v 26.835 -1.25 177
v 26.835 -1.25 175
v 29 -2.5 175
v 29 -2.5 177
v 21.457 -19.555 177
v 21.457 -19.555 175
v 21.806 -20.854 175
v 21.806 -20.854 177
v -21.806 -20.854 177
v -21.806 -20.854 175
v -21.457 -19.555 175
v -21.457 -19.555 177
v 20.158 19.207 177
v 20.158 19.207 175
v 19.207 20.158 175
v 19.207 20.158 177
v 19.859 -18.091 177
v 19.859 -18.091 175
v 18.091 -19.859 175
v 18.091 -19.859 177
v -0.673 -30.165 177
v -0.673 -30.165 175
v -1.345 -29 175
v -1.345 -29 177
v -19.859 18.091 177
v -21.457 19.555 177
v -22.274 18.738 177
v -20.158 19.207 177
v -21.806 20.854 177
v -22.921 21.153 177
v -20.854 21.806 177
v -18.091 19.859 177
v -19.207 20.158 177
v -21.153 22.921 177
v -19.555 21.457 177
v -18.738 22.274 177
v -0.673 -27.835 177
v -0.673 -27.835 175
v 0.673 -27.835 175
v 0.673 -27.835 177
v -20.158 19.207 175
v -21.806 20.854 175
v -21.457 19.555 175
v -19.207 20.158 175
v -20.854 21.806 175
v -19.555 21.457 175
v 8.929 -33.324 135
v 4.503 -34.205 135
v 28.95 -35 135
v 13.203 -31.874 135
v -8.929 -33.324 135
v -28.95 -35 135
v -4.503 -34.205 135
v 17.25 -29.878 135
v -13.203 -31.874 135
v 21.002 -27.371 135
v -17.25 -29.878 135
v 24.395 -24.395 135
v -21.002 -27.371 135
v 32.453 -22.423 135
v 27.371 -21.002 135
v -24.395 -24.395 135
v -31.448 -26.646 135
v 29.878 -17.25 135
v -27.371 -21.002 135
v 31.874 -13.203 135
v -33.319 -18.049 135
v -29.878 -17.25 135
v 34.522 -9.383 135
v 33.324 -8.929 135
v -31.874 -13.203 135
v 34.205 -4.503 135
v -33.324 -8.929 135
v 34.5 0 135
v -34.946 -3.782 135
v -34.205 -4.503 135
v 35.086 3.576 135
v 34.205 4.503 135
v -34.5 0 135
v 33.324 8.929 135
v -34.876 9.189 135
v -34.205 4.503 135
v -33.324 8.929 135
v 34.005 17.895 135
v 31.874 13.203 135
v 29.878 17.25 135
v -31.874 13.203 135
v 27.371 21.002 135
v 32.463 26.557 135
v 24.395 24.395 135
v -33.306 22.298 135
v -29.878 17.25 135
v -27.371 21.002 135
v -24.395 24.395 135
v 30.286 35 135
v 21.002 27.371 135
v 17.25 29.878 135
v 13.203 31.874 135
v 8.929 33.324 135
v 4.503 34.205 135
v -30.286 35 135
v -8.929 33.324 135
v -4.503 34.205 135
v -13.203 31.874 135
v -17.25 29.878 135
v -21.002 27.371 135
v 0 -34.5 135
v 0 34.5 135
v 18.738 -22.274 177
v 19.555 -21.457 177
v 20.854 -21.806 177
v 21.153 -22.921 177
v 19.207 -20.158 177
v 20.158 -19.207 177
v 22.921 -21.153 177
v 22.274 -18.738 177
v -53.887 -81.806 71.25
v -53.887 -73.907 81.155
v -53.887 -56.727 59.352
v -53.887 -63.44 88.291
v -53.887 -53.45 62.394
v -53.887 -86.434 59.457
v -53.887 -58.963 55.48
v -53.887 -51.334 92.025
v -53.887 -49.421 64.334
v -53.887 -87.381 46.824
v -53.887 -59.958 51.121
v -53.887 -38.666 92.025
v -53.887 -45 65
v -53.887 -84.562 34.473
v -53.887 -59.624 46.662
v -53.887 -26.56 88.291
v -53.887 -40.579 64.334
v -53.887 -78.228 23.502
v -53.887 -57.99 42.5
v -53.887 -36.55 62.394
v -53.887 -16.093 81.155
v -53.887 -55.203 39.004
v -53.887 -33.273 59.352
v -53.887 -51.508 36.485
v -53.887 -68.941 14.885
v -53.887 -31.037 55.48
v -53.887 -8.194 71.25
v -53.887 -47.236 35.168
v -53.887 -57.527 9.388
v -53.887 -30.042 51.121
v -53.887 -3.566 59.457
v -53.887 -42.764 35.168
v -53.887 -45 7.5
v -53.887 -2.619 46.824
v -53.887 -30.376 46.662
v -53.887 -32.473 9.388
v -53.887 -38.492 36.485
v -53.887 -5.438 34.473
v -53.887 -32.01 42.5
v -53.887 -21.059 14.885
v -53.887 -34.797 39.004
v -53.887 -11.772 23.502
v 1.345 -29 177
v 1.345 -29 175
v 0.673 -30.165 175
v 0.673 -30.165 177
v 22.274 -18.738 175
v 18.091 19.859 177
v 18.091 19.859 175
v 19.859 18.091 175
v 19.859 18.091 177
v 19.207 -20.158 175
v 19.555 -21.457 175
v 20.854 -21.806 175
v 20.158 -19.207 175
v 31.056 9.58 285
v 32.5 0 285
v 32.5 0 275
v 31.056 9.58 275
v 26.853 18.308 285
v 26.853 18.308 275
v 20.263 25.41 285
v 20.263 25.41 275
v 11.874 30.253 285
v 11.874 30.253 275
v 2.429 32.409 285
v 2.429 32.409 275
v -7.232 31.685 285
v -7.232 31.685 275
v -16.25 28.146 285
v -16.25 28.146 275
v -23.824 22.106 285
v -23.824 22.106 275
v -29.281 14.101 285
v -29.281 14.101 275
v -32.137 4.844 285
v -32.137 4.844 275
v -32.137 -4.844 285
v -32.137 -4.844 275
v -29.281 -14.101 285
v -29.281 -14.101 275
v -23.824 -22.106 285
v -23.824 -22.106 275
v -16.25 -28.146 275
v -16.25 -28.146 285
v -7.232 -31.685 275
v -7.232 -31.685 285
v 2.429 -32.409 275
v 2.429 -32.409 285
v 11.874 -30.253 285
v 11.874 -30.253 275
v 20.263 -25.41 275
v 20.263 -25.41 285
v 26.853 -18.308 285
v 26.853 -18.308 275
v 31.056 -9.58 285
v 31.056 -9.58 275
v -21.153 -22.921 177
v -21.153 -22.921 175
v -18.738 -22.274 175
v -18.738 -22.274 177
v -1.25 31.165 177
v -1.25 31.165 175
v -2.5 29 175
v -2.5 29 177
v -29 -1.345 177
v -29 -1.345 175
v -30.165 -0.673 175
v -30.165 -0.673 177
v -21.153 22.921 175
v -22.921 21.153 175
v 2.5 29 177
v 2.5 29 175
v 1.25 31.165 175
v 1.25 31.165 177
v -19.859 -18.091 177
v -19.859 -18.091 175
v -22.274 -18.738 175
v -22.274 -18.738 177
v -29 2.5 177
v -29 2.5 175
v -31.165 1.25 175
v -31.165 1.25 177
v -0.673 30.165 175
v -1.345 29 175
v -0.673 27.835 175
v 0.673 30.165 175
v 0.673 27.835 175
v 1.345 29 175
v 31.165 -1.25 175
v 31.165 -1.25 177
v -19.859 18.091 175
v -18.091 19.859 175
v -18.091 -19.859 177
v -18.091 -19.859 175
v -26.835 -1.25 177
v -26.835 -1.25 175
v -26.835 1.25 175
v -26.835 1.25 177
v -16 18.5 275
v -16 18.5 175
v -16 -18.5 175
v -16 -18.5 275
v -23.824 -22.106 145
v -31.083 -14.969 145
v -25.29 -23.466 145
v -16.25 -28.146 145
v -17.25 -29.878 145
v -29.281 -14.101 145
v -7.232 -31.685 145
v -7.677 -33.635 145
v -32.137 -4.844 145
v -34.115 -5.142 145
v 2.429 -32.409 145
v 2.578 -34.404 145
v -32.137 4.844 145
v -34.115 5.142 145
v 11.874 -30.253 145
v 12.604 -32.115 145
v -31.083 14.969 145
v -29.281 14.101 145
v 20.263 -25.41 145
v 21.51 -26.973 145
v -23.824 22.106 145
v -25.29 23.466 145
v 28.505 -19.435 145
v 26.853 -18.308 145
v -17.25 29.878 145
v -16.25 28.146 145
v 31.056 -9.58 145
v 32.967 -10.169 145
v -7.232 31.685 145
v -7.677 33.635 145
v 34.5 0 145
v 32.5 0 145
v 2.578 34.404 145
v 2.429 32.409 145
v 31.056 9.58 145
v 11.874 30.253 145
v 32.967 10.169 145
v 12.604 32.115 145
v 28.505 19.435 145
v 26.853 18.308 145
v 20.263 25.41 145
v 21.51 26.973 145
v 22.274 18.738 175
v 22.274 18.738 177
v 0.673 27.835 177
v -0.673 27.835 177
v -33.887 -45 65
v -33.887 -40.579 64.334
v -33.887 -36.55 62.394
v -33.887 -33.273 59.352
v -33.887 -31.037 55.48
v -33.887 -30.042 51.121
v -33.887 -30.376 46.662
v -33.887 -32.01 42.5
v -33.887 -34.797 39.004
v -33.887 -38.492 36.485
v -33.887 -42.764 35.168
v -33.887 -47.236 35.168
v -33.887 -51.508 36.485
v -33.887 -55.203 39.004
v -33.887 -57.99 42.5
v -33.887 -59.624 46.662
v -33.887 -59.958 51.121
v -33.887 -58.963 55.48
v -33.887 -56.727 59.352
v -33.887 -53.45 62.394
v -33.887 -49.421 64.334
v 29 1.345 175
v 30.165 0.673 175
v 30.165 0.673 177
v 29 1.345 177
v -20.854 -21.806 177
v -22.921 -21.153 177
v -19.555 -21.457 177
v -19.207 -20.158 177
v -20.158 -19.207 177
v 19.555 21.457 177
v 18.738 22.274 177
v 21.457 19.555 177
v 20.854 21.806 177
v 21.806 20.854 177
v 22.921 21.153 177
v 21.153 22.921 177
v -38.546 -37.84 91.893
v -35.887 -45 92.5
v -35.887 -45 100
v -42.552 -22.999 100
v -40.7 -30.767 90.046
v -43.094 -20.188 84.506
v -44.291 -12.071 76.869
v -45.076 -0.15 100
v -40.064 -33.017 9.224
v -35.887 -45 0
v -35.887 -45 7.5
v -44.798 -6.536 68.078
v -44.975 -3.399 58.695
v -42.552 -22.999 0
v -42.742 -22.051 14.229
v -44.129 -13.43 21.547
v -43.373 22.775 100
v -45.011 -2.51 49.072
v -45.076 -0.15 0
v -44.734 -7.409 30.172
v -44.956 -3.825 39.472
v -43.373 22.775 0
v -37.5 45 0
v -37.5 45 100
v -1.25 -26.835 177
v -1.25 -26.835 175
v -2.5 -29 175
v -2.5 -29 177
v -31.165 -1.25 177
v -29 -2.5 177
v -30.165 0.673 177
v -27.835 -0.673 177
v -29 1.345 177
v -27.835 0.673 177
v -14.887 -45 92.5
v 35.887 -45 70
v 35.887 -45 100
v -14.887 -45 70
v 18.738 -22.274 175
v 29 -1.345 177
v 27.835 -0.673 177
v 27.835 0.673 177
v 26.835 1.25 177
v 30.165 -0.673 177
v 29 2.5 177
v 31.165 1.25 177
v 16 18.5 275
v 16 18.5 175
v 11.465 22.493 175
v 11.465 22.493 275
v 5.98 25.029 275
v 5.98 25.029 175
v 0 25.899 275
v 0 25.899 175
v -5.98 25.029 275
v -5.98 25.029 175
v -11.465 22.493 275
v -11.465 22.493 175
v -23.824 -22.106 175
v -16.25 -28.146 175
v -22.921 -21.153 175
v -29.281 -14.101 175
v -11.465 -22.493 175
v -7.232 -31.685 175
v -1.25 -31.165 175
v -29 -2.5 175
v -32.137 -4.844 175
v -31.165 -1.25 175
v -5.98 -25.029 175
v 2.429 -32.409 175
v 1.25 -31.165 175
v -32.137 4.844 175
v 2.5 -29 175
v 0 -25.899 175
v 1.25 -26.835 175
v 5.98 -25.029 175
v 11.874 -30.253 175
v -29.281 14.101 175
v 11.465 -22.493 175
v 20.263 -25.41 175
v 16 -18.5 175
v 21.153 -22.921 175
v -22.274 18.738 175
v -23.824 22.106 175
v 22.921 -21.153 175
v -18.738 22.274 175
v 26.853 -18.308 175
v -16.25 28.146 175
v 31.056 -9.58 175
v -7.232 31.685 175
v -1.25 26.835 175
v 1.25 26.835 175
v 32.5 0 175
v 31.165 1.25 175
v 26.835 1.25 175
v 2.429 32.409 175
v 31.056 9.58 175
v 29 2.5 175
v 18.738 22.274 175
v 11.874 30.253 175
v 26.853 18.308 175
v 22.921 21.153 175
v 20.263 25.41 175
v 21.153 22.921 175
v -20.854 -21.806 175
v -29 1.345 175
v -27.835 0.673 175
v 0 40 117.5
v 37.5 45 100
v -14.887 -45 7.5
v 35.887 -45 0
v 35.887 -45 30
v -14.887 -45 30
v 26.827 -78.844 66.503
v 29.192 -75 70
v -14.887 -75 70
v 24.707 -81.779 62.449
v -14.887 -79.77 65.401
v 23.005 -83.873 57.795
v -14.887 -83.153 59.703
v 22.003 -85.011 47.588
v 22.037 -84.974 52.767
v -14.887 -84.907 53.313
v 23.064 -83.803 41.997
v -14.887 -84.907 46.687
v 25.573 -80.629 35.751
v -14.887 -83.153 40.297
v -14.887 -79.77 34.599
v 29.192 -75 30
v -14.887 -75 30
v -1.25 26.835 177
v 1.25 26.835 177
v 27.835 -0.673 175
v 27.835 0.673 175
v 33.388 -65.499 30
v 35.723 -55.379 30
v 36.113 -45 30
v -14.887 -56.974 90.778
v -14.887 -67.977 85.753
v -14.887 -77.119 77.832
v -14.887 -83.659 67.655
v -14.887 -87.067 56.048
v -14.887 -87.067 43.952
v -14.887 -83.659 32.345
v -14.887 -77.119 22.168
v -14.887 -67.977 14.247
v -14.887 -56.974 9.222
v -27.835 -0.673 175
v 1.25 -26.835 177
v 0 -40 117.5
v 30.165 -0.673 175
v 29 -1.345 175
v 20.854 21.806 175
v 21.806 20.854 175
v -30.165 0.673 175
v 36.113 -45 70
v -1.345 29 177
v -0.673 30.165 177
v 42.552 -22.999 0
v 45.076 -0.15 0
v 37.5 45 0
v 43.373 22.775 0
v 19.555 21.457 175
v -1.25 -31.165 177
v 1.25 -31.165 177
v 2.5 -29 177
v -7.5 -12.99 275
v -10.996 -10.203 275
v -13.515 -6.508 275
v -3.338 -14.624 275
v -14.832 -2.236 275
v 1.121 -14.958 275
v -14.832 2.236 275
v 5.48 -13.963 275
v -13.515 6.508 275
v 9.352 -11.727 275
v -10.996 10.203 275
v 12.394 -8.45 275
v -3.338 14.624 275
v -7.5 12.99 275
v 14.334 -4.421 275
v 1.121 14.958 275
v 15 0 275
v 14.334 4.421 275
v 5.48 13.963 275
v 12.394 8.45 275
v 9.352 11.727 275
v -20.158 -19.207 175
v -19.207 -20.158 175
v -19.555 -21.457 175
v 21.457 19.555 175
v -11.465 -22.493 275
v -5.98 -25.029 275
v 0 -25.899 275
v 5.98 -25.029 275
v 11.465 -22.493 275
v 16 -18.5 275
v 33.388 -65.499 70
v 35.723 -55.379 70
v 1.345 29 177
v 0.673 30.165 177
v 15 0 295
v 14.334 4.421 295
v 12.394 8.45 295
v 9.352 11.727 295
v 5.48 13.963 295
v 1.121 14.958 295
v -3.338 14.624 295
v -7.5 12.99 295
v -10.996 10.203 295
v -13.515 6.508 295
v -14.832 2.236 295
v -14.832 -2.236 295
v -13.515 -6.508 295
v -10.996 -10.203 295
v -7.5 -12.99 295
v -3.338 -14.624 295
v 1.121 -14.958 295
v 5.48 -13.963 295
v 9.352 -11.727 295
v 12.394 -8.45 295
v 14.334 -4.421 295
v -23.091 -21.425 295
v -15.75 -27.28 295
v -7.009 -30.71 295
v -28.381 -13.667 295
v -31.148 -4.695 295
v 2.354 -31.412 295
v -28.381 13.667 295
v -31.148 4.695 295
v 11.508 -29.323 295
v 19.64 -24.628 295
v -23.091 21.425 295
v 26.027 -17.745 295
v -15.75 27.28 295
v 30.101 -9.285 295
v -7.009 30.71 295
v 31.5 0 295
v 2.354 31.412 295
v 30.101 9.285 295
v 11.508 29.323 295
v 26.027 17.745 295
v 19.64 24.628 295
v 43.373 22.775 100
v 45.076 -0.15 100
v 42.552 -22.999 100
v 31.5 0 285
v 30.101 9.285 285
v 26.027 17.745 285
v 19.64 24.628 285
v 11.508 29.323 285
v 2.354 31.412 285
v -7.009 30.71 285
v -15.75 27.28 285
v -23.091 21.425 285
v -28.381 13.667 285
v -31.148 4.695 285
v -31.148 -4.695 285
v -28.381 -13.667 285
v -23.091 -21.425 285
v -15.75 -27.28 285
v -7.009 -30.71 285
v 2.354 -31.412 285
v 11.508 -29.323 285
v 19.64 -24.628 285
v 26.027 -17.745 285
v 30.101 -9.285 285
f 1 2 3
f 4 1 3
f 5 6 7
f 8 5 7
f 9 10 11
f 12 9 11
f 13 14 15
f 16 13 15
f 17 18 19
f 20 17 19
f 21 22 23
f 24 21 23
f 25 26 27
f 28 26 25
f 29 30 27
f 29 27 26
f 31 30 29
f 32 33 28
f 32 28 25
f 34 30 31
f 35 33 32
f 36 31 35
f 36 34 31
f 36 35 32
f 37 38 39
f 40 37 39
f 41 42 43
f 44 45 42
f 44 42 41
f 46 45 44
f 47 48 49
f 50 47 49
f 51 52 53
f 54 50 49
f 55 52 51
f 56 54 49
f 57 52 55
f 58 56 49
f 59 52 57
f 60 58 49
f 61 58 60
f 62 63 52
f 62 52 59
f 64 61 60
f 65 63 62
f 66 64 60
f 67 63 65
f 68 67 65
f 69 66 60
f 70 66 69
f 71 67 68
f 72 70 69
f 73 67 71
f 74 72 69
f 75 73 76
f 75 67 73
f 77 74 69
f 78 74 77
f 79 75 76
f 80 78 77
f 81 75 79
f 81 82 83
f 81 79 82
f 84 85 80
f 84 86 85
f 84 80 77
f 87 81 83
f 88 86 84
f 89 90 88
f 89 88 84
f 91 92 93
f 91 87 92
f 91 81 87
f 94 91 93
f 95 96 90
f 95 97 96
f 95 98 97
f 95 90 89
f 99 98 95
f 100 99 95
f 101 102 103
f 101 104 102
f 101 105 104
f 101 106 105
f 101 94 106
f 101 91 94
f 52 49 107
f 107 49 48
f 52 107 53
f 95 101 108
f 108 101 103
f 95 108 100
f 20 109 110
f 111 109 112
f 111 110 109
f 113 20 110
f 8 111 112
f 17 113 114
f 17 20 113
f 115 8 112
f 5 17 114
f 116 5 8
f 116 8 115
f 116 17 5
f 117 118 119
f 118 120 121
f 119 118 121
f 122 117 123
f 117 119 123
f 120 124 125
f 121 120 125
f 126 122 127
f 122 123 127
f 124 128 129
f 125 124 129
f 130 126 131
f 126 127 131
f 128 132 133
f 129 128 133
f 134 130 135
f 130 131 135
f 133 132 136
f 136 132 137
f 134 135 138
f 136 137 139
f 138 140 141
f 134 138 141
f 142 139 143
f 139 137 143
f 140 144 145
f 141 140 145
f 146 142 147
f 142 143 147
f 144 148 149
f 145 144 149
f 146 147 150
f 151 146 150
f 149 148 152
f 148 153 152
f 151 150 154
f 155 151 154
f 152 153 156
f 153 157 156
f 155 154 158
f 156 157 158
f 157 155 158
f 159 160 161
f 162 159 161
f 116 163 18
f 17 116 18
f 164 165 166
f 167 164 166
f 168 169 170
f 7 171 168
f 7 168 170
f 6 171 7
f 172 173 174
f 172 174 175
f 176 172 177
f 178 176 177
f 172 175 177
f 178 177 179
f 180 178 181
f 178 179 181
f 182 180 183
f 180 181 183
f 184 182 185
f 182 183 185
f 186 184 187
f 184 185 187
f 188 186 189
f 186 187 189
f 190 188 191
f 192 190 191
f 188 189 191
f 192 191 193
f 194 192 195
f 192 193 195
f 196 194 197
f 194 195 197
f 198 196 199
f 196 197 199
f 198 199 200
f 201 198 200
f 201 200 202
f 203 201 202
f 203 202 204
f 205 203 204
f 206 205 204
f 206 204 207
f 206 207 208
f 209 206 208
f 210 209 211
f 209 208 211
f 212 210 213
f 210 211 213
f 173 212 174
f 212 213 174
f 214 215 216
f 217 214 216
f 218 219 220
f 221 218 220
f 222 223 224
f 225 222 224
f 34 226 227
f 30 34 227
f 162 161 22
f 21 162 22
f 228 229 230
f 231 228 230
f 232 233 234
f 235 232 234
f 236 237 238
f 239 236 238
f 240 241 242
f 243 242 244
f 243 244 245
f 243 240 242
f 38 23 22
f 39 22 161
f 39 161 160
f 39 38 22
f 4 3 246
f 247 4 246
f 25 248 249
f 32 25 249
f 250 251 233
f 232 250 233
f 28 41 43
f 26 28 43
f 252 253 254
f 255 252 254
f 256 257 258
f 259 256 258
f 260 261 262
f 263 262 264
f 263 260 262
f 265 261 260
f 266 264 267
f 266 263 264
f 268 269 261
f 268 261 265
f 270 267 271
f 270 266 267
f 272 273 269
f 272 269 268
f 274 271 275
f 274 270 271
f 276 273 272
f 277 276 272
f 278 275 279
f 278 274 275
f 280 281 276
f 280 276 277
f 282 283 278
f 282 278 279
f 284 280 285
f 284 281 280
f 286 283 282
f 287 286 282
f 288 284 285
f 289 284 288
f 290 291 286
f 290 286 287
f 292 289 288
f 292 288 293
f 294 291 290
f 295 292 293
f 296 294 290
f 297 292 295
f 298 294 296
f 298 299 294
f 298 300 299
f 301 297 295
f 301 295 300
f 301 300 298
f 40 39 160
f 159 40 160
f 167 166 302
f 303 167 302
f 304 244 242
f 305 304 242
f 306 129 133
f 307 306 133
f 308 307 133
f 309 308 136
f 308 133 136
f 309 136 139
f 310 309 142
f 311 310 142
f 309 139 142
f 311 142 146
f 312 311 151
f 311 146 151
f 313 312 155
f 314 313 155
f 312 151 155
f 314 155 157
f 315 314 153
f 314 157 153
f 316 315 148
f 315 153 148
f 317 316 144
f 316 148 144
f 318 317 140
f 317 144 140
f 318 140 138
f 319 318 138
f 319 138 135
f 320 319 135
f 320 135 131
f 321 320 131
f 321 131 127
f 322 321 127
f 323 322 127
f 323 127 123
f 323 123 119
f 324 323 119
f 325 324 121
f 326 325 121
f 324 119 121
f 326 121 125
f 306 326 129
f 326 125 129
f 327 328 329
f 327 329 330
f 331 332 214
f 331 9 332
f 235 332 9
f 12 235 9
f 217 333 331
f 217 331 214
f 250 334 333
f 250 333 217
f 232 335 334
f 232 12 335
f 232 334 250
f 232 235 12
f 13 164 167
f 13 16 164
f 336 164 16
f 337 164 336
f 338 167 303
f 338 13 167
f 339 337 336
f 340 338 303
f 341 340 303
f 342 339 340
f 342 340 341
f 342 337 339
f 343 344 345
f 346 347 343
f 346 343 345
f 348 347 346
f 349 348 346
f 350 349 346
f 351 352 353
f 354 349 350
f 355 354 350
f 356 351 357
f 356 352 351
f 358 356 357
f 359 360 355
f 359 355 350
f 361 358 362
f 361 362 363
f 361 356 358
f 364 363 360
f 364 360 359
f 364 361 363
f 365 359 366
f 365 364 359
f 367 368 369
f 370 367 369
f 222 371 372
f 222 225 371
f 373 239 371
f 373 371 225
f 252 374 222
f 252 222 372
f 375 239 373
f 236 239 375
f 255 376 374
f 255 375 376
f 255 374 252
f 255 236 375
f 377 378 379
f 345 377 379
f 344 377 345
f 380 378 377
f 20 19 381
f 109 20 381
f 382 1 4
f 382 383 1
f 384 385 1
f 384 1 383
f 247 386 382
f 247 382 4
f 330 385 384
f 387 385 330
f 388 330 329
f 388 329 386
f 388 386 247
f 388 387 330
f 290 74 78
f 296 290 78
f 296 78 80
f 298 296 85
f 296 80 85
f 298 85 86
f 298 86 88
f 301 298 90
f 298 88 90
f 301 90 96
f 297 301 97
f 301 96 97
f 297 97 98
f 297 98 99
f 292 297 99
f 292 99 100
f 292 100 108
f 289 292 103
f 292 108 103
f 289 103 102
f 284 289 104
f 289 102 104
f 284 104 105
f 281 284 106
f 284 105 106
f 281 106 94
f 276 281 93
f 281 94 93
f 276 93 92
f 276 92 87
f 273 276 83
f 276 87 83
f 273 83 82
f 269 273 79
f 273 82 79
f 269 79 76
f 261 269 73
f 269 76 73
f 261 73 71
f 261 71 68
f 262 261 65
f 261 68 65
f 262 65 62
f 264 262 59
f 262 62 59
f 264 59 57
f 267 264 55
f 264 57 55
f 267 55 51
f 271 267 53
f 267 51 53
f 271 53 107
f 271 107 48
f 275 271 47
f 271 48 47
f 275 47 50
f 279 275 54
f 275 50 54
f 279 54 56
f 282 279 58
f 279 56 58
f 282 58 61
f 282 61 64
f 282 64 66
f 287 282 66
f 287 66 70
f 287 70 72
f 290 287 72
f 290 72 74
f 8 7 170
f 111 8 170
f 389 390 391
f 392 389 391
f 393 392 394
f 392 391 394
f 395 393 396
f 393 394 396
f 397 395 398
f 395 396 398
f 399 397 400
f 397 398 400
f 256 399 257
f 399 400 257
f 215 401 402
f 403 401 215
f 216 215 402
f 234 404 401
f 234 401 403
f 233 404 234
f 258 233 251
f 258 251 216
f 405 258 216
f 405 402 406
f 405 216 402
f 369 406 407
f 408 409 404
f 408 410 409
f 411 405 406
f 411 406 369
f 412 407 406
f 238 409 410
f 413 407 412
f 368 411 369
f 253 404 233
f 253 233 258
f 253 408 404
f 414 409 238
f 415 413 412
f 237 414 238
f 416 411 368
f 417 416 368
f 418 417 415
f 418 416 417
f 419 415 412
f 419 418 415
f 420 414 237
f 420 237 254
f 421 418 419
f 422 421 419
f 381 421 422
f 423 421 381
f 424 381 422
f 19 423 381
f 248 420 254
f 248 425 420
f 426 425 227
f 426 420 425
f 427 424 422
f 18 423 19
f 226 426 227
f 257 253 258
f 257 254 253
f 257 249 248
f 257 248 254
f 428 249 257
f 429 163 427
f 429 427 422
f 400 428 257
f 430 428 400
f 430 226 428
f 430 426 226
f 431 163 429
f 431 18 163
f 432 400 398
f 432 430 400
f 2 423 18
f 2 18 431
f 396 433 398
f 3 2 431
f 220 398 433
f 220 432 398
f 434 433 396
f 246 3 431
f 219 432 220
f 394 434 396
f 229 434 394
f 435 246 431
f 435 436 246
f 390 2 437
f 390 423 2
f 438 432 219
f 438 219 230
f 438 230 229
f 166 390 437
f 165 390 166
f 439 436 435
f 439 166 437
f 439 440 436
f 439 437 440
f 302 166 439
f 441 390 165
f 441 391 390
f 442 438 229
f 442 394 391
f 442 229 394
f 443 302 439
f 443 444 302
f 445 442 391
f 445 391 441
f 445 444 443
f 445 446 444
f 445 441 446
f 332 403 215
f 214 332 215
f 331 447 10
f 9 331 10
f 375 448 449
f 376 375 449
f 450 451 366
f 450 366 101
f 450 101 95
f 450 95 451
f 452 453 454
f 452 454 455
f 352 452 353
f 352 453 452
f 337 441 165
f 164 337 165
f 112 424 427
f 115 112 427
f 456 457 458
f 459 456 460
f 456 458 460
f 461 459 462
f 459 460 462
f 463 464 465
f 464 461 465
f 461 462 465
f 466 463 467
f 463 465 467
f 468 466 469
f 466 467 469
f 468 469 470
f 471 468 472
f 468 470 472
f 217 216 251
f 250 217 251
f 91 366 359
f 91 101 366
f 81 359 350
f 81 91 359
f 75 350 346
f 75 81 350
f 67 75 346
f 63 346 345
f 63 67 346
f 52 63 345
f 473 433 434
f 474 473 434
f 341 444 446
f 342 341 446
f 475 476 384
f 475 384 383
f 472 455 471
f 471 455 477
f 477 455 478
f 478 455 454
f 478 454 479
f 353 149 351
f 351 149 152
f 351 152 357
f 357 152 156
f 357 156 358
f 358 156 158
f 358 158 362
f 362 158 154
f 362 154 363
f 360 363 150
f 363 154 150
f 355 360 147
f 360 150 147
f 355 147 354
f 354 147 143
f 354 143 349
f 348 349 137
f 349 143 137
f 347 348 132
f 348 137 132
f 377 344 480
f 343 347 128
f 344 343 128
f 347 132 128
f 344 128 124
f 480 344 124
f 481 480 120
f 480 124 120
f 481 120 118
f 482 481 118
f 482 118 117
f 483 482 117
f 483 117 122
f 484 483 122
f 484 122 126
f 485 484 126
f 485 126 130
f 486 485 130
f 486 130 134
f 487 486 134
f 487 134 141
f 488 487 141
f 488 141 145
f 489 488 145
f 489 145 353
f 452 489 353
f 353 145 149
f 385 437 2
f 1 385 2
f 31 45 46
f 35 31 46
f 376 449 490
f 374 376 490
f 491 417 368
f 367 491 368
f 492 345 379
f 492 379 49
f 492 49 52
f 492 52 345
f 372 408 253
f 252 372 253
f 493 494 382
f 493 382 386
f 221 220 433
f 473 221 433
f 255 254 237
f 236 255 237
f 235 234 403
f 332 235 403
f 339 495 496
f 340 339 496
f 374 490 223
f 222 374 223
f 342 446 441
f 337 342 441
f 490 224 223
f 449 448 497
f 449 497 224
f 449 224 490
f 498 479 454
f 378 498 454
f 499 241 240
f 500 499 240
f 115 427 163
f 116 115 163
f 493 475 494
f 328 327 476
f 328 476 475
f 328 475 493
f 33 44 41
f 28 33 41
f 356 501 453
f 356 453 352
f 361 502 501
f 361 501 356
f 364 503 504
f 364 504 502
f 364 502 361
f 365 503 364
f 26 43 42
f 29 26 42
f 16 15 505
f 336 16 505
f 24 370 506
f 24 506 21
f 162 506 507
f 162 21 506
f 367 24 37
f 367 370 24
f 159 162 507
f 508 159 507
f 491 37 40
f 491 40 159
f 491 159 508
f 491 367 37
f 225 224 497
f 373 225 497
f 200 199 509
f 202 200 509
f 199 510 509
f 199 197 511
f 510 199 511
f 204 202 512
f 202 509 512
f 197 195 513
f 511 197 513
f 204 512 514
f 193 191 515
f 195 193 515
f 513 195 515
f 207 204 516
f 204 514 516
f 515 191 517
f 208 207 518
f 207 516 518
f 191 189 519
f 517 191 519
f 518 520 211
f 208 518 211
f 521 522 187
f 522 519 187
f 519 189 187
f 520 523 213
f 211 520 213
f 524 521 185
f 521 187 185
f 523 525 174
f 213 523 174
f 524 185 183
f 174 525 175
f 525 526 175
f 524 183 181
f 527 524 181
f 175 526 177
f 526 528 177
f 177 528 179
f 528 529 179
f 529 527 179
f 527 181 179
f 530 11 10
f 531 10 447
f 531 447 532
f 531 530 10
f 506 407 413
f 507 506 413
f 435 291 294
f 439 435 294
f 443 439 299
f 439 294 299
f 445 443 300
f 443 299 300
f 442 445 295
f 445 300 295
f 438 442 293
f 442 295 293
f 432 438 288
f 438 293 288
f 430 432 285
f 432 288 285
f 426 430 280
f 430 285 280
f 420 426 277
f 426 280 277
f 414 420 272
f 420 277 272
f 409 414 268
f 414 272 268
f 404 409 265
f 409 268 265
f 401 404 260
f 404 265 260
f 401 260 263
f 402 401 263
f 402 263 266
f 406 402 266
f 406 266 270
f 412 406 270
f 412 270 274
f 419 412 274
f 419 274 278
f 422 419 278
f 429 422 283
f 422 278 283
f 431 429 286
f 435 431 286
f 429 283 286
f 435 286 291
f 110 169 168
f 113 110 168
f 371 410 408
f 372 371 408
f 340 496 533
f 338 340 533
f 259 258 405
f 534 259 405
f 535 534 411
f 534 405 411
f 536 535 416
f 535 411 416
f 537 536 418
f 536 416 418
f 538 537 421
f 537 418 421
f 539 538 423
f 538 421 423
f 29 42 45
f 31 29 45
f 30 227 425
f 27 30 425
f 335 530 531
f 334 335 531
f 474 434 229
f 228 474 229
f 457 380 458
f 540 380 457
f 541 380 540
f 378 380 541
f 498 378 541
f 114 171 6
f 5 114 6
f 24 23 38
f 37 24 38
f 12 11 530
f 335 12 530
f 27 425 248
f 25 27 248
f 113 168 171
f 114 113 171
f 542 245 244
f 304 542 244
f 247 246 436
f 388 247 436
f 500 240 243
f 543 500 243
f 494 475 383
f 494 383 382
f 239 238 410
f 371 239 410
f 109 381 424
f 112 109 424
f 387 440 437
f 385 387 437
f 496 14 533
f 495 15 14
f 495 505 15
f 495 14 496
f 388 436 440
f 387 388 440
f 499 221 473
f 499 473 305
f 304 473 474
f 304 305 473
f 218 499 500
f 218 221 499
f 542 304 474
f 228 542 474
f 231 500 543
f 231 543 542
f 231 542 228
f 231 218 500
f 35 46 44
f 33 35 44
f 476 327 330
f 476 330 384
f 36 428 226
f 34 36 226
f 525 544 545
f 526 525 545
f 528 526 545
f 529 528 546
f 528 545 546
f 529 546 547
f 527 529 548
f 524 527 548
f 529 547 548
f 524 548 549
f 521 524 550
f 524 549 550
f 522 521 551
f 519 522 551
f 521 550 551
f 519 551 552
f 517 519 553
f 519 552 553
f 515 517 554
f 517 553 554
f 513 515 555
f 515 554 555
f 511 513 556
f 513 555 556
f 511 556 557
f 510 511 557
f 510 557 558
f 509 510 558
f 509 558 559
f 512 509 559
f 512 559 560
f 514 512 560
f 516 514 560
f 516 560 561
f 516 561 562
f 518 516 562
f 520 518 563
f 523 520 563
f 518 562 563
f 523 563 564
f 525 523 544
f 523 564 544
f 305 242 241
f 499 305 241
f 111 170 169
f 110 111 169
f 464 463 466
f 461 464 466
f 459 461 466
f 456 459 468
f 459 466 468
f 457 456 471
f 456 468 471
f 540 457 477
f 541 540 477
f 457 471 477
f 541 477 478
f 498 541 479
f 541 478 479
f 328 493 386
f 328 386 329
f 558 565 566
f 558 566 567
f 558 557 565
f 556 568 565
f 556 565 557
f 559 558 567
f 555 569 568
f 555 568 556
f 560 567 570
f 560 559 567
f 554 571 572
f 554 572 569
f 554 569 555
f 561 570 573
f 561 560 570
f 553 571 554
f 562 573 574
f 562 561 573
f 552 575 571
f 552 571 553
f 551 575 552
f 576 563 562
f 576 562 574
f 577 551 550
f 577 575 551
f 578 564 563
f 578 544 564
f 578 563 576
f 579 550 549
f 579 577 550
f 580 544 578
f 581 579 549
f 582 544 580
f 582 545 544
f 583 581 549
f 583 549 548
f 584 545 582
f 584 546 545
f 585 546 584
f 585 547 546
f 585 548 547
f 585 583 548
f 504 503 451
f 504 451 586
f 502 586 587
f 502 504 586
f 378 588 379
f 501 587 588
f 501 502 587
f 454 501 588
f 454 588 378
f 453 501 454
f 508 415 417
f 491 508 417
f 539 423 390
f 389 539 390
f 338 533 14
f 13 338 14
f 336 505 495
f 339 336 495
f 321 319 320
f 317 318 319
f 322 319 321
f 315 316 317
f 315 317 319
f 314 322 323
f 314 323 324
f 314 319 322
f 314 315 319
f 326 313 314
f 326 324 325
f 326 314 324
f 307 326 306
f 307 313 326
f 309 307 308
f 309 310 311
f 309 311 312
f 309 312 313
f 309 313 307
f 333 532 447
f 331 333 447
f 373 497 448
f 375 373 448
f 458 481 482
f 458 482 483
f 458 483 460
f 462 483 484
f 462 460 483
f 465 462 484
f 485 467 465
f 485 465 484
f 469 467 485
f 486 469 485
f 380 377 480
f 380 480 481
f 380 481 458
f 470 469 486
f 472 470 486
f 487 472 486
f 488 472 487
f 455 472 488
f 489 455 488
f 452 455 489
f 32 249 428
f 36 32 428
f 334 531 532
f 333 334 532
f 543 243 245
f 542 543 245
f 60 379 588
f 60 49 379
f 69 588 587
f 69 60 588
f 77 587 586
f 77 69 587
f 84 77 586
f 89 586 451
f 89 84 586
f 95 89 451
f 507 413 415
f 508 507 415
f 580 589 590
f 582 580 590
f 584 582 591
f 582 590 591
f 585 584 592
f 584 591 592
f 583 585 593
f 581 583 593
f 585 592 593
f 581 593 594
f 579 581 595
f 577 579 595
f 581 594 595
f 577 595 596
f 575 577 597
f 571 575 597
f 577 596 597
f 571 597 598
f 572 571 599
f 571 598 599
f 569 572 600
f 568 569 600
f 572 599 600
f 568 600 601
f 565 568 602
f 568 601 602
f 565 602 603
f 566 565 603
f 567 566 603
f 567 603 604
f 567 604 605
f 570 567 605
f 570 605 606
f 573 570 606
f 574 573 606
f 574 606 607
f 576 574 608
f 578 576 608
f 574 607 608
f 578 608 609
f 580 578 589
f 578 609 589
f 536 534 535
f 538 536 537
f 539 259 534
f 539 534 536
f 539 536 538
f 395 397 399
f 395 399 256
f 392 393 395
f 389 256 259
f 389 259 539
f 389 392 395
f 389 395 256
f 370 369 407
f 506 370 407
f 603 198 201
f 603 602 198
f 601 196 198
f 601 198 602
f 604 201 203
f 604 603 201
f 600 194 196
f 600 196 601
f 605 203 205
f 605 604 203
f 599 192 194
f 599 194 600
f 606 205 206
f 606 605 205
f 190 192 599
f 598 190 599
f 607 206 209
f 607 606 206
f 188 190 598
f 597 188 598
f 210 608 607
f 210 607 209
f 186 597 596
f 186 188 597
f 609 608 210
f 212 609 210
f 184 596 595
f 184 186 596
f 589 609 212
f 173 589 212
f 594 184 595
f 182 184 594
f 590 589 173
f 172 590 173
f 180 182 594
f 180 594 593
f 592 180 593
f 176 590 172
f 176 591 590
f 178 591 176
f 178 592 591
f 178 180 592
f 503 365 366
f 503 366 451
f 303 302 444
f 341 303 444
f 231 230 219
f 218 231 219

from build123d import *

# Parameters (mm, degrees)
BOSS_EXTRU_1_DEPTH           = 100
ESQUISSE4_R                  = 34.5
BOSS_EXTRU_2_DEPTH           = 10
ESQUISSE5_R                  = 32.5
BOSS_EXTRU_3_DEPTH           = 30
BOSS_EXTRU_4_DEPTH           = 2
R_P_TITION_START             = 175
R_P_TITION_CIRCULAIRE1_DEPTH = 2
BOSS_EXTRU_5_DEPTH           = 100
ESQUISSE8_R                  = 32.5
BOSS_EXTRU_6_DEPTH           = 10
ESQUISSE9_R                  = 31.5
BOSS_EXTRU_7_DEPTH           = 10
BOSS_EXTRU_8_DEPTH           = 21
BOSS_EXTRU_8_DEPTH_BACK      = 18
ESQUISSE11_R                 = 42.5
BOSS_EXTRU_9_DEPTH           = 35
BOSS_EXTRU_10_DEPTH          = 20
BOSS_EXTRU_10_DEPTH_BACK     = 20
ENL_V_MAT_EXTRU_1_DEPTH      = 317.476302481
ESQUISSE15_R                 = 15
ENL_V_MAT_EXTRU_2_DEPTH      = 20
ESQUISSE16_R                 = 15
ENL_V_MAT_EXTRU_3_DEPTH      = 20


# Read off the part's stored shape, not the designer's step: Répétition circulaire1
with BuildPart() as part:
    # Esquisse1 → Boss.-Extru.1 (new body)
    with BuildSketch(Plane.XY):
        with BuildLine():
            Line((-37.5, 45), (37.5, 45))
            ThreePointArc((37.5, 45), (45.075676523, -0.150274002), (35.886541902, -45))
            Line((35.886541902, -45), (-35.886541902, -45))
            ThreePointArc((-35.886541902, -45), (-45.075676523, -0.150274002), (-37.5, 45))
        make_face()
    extrude(amount=BOSS_EXTRU_1_DEPTH)

    # Esquisse2 for Lissage2 → Lissage2 section 0
    with BuildSketch(Plane.XY.offset(100)):
        with BuildLine():
            Line((-35.886541902, -45), (35.886541902, -45))
            # circular arc as an exact rational Bezier (weights 1, cos(half-angle), 1)
            Bezier((35.886541902, -45), (54.060708359, -0.311351473), (37.5, 45), weights=[1, 0.93292998, 1])
            Line((37.5, 45), (-37.5, 45))
            Bezier((-37.5, 45), (-54.060708359, -0.311351473), (-35.886541902, -45), weights=[1, 0.93292998, 1])
        make_face()
    # Esquisse3 for Lissage2 → Lissage2 section 1
    with BuildSketch(Plane.XY.offset(135)):
        with BuildLine():
            Line((30.286276797, 35), (-30.286276797, 35))
            Bezier((-30.286276797, 35), (-40.80320151, -0.213468414), (-28.950299615, -35), weights=[1, 0.952543259, 1])
            Line((-28.950299615, -35), (28.950299615, -35))
            Bezier((28.950299615, -35), (40.80320151, -0.213468414), (30.286276797, 35), weights=[1, 0.952543259, 1])
        make_face()
    loft()

    # Esquisse4 → Boss.-Extru.2 (add)
    with BuildSketch(Plane.XY.offset(135)):
        Circle(ESQUISSE4_R)
    extrude(amount=BOSS_EXTRU_2_DEPTH)

    # Esquisse5 → Boss.-Extru.3 (add)
    with BuildSketch(Plane.XY.offset(145)):
        Circle(ESQUISSE5_R)
    extrude(amount=BOSS_EXTRU_3_DEPTH)

    # Esquisse6 → Boss.-Extru.4 (add)
    with BuildSketch(Plane.XY.offset(175)):
        Polygon((31.165063509, 1.25), (29, 2.5), (26.834936491, 1.25), (26.834936491, -1.25), (29, -2.5), (31.165063509, -1.25), align=None)
        Polygon((29, 1.345299462), (27.834936491, 0.672649731), (27.834936491, -0.672649731), (29, -1.345299462), (30.165063509, -0.672649731), (30.165063509, 0.672649731), align=None, mode=Mode.SUBTRACT)
    extrude(amount=BOSS_EXTRU_4_DEPTH)

    # Répétition circulaire1 outline → Répétition circulaire1 (add)
    # profile 1 of 7: a face of its own
    with BuildSketch(Plane.XY.offset(R_P_TITION_START)):
        Polygon((22.92091122, 21.153144267), (21.153144267, 22.92091122), (18.738329701, 22.273863607), (18.091282089, 19.859049042), (19.859049042, 18.091282089), (22.273863607, 18.738329701), align=None)
        Polygon((19.20663716, 20.157907532), (19.554826282, 21.457367026), (20.854285776, 21.805556148), (21.805556148, 20.854285776), (21.457367026, 19.554826282), (20.157907532, 19.20663716), align=None, mode=Mode.SUBTRACT)
    # profile 2 of 7: a face of its own
    with BuildSketch(Plane.XY.offset(R_P_TITION_START)):
        Polygon((21.153144267, -22.92091122), (22.92091122, -21.153144267), (22.273863607, -18.738329701), (19.859049042, -18.091282089), (18.091282089, -19.859049042), (18.738329701, -22.273863607), align=None)
        Polygon((20.157907532, -19.20663716), (21.457367026, -19.554826282), (21.805556148, -20.854285776), (20.854285776, -21.805556148), (19.554826282, -21.457367026), (19.20663716, -20.157907532), align=None, mode=Mode.SUBTRACT)
    # profile 3 of 7: a face of its own
    with BuildSketch(Plane.XY.offset(R_P_TITION_START)):
        Polygon((-1.25, -31.165063509), (1.25, -31.165063509), (2.5, -29), (1.25, -26.834936491), (-1.25, -26.834936491), (-2.5, -29), align=None)
        Polygon((0.672649731, -27.834936491), (1.345299462, -29), (0.672649731, -30.165063509), (-0.672649731, -30.165063509), (-1.345299462, -29), (-0.672649731, -27.834936491), align=None, mode=Mode.SUBTRACT)
    # profile 4 of 7: a face of its own
    with BuildSketch(Plane.XY.offset(R_P_TITION_START)):
        Polygon((-22.92091122, -21.153144267), (-21.153144267, -22.92091122), (-18.738329701, -22.273863607), (-18.091282089, -19.859049042), (-19.859049042, -18.091282089), (-22.273863607, -18.738329701), align=None)
        Polygon((-19.20663716, -20.157907532), (-19.554826282, -21.457367026), (-20.854285776, -21.805556148), (-21.805556148, -20.854285776), (-21.457367026, -19.554826282), (-20.157907532, -19.20663716), align=None, mode=Mode.SUBTRACT)
    # profile 5 of 7: a face of its own
    with BuildSketch(Plane.XY.offset(R_P_TITION_START)):
        Polygon((-31.165063509, 1.25), (-31.165063509, -1.25), (-29, -2.5), (-26.834936491, -1.25), (-26.834936491, 1.25), (-29, 2.5), align=None)
        Polygon((-27.834936491, -0.672649731), (-29, -1.345299462), (-30.165063509, -0.672649731), (-30.165063509, 0.672649731), (-29, 1.345299462), (-27.834936491, 0.672649731), align=None, mode=Mode.SUBTRACT)
    # profile 6 of 7: a face of its own
    with BuildSketch(Plane.XY.offset(R_P_TITION_START)):
        Polygon((-21.153144267, 22.92091122), (-22.92091122, 21.153144267), (-22.273863607, 18.738329701), (-19.859049042, 18.091282089), (-18.091282089, 19.859049042), (-18.738329701, 22.273863607), align=None)
        Polygon((-20.157907532, 19.20663716), (-21.457367026, 19.554826282), (-21.805556148, 20.854285776), (-20.854285776, 21.805556148), (-19.554826282, 21.457367026), (-19.20663716, 20.157907532), align=None, mode=Mode.SUBTRACT)
    # profile 7 of 7: a face of its own
    with BuildSketch(Plane.XY.offset(R_P_TITION_START)):
        Polygon((1.25, 31.165063509), (-1.25, 31.165063509), (-2.5, 29), (-1.25, 26.834936491), (1.25, 26.834936491), (2.5, 29), align=None)
        Polygon((-0.672649731, 27.834936491), (-1.345299462, 29), (-0.672649731, 30.165063509), (0.672649731, 30.165063509), (1.345299462, 29), (0.672649731, 27.834936491), align=None, mode=Mode.SUBTRACT)
    extrude(amount=R_P_TITION_CIRCULAIRE1_DEPTH)

    # Esquisse7 → Boss.-Extru.5 (add)
    with BuildSketch(Plane.XY.offset(175)):
        with BuildLine():
            Line((16, -18.5), (16, 18.5))
            ThreePointArc((16, 18.5), (0, 25.898529491), (-16, 18.5))
            Line((-16, 18.5), (-16, -18.5))
            ThreePointArc((-16, -18.5), (0, -25.898529491), (16, -18.5))
        make_face()
    extrude(amount=BOSS_EXTRU_5_DEPTH)

    # Esquisse11 → Boss.-Extru.8 (add, two sides: drawn at the far end of the back side and taken through both)
    with BuildSketch(Plane(origin=(-35.886541902, 0, 0), x_dir=(0, 0, -1), z_dir=(1, 0, 0)).offset(-BOSS_EXTRU_8_DEPTH_BACK)):
        with Locations((-50, -45)):
            Circle(ESQUISSE11_R)
    extrude(amount=BOSS_EXTRU_8_DEPTH + BOSS_EXTRU_8_DEPTH_BACK)

    # Esquisse12 → Boss.-Extru.9 (add)
    with BuildSketch(Plane(origin=(-14.886541902, 0, 0), x_dir=(0, 0, -1), z_dir=(1, 0, 0))):
        with BuildLine():
            Line((-70, -45), (-70, -75))
            ThreePointArc((-70, -75), (-50, -85.128852225), (-30, -75))
            Line((-30, -75), (-30, -45))
            Line((-30, -45), (-70, -45))
        make_face()
    extrude(amount=BOSS_EXTRU_9_DEPTH)

    # Esquisse13 → Boss.-Extru.10 (add, two sides: drawn at the far end of the back side and taken through both)
    with BuildSketch(Plane.XY.offset(50).offset(-BOSS_EXTRU_10_DEPTH_BACK)):
        with BuildLine():
            Line((20.113458098, -45), (20.113458098, -87))
            ThreePointArc((20.113458098, -87), (32.599371533, -67.708919404), (36.113458098, -45))
            Line((36.113458098, -45), (20.113458098, -45))
        make_face()
    extrude(amount=BOSS_EXTRU_10_DEPTH + BOSS_EXTRU_10_DEPTH_BACK)

    # Esquisse14 → Enlèv. mat.-Extru.1 (cut, through all)
    with BuildSketch(Plane.ZY.offset(-20.113458098)):
        with BuildLine():
            Line((70, -75), (70, -87))
            Line((70, -87), (30, -87))
            Line((30, -87), (30, -75))
            ThreePointArc((30, -75), (50, -85.128852225), (70, -75))
        make_face()
    extrude(amount=-ENL_V_MAT_EXTRU_1_DEPTH, mode=Mode.SUBTRACT)

    # Esquisse16 → Enlèv. mat.-Extru.3 (cut)
    with BuildSketch(Plane.ZY.offset(53.886541902)):
        with Locations((50, -45)):
            Circle(ESQUISSE16_R)
    extrude(amount=-ENL_V_MAT_EXTRU_3_DEPTH, mode=Mode.SUBTRACT)


with BuildPart() as body_2:
    # Esquisse8 → Boss.-Extru.6 (new body)
    with BuildSketch(Plane.XY.offset(275)):
        Circle(ESQUISSE8_R)
    extrude(amount=BOSS_EXTRU_6_DEPTH)

    # Esquisse9 → Boss.-Extru.7 (add)
    with BuildSketch(Plane.XY.offset(285)):
        Circle(ESQUISSE9_R)
    extrude(amount=BOSS_EXTRU_7_DEPTH)

    # Esquisse15 → Enlèv. mat.-Extru.2 (cut)
    with BuildSketch(Plane.XY.offset(295)):
        Circle(ESQUISSE15_R)
    extrude(amount=-ENL_V_MAT_EXTRU_2_DEPTH, mode=Mode.SUBTRACT)


solid = Compound([part.part, body_2.part])
